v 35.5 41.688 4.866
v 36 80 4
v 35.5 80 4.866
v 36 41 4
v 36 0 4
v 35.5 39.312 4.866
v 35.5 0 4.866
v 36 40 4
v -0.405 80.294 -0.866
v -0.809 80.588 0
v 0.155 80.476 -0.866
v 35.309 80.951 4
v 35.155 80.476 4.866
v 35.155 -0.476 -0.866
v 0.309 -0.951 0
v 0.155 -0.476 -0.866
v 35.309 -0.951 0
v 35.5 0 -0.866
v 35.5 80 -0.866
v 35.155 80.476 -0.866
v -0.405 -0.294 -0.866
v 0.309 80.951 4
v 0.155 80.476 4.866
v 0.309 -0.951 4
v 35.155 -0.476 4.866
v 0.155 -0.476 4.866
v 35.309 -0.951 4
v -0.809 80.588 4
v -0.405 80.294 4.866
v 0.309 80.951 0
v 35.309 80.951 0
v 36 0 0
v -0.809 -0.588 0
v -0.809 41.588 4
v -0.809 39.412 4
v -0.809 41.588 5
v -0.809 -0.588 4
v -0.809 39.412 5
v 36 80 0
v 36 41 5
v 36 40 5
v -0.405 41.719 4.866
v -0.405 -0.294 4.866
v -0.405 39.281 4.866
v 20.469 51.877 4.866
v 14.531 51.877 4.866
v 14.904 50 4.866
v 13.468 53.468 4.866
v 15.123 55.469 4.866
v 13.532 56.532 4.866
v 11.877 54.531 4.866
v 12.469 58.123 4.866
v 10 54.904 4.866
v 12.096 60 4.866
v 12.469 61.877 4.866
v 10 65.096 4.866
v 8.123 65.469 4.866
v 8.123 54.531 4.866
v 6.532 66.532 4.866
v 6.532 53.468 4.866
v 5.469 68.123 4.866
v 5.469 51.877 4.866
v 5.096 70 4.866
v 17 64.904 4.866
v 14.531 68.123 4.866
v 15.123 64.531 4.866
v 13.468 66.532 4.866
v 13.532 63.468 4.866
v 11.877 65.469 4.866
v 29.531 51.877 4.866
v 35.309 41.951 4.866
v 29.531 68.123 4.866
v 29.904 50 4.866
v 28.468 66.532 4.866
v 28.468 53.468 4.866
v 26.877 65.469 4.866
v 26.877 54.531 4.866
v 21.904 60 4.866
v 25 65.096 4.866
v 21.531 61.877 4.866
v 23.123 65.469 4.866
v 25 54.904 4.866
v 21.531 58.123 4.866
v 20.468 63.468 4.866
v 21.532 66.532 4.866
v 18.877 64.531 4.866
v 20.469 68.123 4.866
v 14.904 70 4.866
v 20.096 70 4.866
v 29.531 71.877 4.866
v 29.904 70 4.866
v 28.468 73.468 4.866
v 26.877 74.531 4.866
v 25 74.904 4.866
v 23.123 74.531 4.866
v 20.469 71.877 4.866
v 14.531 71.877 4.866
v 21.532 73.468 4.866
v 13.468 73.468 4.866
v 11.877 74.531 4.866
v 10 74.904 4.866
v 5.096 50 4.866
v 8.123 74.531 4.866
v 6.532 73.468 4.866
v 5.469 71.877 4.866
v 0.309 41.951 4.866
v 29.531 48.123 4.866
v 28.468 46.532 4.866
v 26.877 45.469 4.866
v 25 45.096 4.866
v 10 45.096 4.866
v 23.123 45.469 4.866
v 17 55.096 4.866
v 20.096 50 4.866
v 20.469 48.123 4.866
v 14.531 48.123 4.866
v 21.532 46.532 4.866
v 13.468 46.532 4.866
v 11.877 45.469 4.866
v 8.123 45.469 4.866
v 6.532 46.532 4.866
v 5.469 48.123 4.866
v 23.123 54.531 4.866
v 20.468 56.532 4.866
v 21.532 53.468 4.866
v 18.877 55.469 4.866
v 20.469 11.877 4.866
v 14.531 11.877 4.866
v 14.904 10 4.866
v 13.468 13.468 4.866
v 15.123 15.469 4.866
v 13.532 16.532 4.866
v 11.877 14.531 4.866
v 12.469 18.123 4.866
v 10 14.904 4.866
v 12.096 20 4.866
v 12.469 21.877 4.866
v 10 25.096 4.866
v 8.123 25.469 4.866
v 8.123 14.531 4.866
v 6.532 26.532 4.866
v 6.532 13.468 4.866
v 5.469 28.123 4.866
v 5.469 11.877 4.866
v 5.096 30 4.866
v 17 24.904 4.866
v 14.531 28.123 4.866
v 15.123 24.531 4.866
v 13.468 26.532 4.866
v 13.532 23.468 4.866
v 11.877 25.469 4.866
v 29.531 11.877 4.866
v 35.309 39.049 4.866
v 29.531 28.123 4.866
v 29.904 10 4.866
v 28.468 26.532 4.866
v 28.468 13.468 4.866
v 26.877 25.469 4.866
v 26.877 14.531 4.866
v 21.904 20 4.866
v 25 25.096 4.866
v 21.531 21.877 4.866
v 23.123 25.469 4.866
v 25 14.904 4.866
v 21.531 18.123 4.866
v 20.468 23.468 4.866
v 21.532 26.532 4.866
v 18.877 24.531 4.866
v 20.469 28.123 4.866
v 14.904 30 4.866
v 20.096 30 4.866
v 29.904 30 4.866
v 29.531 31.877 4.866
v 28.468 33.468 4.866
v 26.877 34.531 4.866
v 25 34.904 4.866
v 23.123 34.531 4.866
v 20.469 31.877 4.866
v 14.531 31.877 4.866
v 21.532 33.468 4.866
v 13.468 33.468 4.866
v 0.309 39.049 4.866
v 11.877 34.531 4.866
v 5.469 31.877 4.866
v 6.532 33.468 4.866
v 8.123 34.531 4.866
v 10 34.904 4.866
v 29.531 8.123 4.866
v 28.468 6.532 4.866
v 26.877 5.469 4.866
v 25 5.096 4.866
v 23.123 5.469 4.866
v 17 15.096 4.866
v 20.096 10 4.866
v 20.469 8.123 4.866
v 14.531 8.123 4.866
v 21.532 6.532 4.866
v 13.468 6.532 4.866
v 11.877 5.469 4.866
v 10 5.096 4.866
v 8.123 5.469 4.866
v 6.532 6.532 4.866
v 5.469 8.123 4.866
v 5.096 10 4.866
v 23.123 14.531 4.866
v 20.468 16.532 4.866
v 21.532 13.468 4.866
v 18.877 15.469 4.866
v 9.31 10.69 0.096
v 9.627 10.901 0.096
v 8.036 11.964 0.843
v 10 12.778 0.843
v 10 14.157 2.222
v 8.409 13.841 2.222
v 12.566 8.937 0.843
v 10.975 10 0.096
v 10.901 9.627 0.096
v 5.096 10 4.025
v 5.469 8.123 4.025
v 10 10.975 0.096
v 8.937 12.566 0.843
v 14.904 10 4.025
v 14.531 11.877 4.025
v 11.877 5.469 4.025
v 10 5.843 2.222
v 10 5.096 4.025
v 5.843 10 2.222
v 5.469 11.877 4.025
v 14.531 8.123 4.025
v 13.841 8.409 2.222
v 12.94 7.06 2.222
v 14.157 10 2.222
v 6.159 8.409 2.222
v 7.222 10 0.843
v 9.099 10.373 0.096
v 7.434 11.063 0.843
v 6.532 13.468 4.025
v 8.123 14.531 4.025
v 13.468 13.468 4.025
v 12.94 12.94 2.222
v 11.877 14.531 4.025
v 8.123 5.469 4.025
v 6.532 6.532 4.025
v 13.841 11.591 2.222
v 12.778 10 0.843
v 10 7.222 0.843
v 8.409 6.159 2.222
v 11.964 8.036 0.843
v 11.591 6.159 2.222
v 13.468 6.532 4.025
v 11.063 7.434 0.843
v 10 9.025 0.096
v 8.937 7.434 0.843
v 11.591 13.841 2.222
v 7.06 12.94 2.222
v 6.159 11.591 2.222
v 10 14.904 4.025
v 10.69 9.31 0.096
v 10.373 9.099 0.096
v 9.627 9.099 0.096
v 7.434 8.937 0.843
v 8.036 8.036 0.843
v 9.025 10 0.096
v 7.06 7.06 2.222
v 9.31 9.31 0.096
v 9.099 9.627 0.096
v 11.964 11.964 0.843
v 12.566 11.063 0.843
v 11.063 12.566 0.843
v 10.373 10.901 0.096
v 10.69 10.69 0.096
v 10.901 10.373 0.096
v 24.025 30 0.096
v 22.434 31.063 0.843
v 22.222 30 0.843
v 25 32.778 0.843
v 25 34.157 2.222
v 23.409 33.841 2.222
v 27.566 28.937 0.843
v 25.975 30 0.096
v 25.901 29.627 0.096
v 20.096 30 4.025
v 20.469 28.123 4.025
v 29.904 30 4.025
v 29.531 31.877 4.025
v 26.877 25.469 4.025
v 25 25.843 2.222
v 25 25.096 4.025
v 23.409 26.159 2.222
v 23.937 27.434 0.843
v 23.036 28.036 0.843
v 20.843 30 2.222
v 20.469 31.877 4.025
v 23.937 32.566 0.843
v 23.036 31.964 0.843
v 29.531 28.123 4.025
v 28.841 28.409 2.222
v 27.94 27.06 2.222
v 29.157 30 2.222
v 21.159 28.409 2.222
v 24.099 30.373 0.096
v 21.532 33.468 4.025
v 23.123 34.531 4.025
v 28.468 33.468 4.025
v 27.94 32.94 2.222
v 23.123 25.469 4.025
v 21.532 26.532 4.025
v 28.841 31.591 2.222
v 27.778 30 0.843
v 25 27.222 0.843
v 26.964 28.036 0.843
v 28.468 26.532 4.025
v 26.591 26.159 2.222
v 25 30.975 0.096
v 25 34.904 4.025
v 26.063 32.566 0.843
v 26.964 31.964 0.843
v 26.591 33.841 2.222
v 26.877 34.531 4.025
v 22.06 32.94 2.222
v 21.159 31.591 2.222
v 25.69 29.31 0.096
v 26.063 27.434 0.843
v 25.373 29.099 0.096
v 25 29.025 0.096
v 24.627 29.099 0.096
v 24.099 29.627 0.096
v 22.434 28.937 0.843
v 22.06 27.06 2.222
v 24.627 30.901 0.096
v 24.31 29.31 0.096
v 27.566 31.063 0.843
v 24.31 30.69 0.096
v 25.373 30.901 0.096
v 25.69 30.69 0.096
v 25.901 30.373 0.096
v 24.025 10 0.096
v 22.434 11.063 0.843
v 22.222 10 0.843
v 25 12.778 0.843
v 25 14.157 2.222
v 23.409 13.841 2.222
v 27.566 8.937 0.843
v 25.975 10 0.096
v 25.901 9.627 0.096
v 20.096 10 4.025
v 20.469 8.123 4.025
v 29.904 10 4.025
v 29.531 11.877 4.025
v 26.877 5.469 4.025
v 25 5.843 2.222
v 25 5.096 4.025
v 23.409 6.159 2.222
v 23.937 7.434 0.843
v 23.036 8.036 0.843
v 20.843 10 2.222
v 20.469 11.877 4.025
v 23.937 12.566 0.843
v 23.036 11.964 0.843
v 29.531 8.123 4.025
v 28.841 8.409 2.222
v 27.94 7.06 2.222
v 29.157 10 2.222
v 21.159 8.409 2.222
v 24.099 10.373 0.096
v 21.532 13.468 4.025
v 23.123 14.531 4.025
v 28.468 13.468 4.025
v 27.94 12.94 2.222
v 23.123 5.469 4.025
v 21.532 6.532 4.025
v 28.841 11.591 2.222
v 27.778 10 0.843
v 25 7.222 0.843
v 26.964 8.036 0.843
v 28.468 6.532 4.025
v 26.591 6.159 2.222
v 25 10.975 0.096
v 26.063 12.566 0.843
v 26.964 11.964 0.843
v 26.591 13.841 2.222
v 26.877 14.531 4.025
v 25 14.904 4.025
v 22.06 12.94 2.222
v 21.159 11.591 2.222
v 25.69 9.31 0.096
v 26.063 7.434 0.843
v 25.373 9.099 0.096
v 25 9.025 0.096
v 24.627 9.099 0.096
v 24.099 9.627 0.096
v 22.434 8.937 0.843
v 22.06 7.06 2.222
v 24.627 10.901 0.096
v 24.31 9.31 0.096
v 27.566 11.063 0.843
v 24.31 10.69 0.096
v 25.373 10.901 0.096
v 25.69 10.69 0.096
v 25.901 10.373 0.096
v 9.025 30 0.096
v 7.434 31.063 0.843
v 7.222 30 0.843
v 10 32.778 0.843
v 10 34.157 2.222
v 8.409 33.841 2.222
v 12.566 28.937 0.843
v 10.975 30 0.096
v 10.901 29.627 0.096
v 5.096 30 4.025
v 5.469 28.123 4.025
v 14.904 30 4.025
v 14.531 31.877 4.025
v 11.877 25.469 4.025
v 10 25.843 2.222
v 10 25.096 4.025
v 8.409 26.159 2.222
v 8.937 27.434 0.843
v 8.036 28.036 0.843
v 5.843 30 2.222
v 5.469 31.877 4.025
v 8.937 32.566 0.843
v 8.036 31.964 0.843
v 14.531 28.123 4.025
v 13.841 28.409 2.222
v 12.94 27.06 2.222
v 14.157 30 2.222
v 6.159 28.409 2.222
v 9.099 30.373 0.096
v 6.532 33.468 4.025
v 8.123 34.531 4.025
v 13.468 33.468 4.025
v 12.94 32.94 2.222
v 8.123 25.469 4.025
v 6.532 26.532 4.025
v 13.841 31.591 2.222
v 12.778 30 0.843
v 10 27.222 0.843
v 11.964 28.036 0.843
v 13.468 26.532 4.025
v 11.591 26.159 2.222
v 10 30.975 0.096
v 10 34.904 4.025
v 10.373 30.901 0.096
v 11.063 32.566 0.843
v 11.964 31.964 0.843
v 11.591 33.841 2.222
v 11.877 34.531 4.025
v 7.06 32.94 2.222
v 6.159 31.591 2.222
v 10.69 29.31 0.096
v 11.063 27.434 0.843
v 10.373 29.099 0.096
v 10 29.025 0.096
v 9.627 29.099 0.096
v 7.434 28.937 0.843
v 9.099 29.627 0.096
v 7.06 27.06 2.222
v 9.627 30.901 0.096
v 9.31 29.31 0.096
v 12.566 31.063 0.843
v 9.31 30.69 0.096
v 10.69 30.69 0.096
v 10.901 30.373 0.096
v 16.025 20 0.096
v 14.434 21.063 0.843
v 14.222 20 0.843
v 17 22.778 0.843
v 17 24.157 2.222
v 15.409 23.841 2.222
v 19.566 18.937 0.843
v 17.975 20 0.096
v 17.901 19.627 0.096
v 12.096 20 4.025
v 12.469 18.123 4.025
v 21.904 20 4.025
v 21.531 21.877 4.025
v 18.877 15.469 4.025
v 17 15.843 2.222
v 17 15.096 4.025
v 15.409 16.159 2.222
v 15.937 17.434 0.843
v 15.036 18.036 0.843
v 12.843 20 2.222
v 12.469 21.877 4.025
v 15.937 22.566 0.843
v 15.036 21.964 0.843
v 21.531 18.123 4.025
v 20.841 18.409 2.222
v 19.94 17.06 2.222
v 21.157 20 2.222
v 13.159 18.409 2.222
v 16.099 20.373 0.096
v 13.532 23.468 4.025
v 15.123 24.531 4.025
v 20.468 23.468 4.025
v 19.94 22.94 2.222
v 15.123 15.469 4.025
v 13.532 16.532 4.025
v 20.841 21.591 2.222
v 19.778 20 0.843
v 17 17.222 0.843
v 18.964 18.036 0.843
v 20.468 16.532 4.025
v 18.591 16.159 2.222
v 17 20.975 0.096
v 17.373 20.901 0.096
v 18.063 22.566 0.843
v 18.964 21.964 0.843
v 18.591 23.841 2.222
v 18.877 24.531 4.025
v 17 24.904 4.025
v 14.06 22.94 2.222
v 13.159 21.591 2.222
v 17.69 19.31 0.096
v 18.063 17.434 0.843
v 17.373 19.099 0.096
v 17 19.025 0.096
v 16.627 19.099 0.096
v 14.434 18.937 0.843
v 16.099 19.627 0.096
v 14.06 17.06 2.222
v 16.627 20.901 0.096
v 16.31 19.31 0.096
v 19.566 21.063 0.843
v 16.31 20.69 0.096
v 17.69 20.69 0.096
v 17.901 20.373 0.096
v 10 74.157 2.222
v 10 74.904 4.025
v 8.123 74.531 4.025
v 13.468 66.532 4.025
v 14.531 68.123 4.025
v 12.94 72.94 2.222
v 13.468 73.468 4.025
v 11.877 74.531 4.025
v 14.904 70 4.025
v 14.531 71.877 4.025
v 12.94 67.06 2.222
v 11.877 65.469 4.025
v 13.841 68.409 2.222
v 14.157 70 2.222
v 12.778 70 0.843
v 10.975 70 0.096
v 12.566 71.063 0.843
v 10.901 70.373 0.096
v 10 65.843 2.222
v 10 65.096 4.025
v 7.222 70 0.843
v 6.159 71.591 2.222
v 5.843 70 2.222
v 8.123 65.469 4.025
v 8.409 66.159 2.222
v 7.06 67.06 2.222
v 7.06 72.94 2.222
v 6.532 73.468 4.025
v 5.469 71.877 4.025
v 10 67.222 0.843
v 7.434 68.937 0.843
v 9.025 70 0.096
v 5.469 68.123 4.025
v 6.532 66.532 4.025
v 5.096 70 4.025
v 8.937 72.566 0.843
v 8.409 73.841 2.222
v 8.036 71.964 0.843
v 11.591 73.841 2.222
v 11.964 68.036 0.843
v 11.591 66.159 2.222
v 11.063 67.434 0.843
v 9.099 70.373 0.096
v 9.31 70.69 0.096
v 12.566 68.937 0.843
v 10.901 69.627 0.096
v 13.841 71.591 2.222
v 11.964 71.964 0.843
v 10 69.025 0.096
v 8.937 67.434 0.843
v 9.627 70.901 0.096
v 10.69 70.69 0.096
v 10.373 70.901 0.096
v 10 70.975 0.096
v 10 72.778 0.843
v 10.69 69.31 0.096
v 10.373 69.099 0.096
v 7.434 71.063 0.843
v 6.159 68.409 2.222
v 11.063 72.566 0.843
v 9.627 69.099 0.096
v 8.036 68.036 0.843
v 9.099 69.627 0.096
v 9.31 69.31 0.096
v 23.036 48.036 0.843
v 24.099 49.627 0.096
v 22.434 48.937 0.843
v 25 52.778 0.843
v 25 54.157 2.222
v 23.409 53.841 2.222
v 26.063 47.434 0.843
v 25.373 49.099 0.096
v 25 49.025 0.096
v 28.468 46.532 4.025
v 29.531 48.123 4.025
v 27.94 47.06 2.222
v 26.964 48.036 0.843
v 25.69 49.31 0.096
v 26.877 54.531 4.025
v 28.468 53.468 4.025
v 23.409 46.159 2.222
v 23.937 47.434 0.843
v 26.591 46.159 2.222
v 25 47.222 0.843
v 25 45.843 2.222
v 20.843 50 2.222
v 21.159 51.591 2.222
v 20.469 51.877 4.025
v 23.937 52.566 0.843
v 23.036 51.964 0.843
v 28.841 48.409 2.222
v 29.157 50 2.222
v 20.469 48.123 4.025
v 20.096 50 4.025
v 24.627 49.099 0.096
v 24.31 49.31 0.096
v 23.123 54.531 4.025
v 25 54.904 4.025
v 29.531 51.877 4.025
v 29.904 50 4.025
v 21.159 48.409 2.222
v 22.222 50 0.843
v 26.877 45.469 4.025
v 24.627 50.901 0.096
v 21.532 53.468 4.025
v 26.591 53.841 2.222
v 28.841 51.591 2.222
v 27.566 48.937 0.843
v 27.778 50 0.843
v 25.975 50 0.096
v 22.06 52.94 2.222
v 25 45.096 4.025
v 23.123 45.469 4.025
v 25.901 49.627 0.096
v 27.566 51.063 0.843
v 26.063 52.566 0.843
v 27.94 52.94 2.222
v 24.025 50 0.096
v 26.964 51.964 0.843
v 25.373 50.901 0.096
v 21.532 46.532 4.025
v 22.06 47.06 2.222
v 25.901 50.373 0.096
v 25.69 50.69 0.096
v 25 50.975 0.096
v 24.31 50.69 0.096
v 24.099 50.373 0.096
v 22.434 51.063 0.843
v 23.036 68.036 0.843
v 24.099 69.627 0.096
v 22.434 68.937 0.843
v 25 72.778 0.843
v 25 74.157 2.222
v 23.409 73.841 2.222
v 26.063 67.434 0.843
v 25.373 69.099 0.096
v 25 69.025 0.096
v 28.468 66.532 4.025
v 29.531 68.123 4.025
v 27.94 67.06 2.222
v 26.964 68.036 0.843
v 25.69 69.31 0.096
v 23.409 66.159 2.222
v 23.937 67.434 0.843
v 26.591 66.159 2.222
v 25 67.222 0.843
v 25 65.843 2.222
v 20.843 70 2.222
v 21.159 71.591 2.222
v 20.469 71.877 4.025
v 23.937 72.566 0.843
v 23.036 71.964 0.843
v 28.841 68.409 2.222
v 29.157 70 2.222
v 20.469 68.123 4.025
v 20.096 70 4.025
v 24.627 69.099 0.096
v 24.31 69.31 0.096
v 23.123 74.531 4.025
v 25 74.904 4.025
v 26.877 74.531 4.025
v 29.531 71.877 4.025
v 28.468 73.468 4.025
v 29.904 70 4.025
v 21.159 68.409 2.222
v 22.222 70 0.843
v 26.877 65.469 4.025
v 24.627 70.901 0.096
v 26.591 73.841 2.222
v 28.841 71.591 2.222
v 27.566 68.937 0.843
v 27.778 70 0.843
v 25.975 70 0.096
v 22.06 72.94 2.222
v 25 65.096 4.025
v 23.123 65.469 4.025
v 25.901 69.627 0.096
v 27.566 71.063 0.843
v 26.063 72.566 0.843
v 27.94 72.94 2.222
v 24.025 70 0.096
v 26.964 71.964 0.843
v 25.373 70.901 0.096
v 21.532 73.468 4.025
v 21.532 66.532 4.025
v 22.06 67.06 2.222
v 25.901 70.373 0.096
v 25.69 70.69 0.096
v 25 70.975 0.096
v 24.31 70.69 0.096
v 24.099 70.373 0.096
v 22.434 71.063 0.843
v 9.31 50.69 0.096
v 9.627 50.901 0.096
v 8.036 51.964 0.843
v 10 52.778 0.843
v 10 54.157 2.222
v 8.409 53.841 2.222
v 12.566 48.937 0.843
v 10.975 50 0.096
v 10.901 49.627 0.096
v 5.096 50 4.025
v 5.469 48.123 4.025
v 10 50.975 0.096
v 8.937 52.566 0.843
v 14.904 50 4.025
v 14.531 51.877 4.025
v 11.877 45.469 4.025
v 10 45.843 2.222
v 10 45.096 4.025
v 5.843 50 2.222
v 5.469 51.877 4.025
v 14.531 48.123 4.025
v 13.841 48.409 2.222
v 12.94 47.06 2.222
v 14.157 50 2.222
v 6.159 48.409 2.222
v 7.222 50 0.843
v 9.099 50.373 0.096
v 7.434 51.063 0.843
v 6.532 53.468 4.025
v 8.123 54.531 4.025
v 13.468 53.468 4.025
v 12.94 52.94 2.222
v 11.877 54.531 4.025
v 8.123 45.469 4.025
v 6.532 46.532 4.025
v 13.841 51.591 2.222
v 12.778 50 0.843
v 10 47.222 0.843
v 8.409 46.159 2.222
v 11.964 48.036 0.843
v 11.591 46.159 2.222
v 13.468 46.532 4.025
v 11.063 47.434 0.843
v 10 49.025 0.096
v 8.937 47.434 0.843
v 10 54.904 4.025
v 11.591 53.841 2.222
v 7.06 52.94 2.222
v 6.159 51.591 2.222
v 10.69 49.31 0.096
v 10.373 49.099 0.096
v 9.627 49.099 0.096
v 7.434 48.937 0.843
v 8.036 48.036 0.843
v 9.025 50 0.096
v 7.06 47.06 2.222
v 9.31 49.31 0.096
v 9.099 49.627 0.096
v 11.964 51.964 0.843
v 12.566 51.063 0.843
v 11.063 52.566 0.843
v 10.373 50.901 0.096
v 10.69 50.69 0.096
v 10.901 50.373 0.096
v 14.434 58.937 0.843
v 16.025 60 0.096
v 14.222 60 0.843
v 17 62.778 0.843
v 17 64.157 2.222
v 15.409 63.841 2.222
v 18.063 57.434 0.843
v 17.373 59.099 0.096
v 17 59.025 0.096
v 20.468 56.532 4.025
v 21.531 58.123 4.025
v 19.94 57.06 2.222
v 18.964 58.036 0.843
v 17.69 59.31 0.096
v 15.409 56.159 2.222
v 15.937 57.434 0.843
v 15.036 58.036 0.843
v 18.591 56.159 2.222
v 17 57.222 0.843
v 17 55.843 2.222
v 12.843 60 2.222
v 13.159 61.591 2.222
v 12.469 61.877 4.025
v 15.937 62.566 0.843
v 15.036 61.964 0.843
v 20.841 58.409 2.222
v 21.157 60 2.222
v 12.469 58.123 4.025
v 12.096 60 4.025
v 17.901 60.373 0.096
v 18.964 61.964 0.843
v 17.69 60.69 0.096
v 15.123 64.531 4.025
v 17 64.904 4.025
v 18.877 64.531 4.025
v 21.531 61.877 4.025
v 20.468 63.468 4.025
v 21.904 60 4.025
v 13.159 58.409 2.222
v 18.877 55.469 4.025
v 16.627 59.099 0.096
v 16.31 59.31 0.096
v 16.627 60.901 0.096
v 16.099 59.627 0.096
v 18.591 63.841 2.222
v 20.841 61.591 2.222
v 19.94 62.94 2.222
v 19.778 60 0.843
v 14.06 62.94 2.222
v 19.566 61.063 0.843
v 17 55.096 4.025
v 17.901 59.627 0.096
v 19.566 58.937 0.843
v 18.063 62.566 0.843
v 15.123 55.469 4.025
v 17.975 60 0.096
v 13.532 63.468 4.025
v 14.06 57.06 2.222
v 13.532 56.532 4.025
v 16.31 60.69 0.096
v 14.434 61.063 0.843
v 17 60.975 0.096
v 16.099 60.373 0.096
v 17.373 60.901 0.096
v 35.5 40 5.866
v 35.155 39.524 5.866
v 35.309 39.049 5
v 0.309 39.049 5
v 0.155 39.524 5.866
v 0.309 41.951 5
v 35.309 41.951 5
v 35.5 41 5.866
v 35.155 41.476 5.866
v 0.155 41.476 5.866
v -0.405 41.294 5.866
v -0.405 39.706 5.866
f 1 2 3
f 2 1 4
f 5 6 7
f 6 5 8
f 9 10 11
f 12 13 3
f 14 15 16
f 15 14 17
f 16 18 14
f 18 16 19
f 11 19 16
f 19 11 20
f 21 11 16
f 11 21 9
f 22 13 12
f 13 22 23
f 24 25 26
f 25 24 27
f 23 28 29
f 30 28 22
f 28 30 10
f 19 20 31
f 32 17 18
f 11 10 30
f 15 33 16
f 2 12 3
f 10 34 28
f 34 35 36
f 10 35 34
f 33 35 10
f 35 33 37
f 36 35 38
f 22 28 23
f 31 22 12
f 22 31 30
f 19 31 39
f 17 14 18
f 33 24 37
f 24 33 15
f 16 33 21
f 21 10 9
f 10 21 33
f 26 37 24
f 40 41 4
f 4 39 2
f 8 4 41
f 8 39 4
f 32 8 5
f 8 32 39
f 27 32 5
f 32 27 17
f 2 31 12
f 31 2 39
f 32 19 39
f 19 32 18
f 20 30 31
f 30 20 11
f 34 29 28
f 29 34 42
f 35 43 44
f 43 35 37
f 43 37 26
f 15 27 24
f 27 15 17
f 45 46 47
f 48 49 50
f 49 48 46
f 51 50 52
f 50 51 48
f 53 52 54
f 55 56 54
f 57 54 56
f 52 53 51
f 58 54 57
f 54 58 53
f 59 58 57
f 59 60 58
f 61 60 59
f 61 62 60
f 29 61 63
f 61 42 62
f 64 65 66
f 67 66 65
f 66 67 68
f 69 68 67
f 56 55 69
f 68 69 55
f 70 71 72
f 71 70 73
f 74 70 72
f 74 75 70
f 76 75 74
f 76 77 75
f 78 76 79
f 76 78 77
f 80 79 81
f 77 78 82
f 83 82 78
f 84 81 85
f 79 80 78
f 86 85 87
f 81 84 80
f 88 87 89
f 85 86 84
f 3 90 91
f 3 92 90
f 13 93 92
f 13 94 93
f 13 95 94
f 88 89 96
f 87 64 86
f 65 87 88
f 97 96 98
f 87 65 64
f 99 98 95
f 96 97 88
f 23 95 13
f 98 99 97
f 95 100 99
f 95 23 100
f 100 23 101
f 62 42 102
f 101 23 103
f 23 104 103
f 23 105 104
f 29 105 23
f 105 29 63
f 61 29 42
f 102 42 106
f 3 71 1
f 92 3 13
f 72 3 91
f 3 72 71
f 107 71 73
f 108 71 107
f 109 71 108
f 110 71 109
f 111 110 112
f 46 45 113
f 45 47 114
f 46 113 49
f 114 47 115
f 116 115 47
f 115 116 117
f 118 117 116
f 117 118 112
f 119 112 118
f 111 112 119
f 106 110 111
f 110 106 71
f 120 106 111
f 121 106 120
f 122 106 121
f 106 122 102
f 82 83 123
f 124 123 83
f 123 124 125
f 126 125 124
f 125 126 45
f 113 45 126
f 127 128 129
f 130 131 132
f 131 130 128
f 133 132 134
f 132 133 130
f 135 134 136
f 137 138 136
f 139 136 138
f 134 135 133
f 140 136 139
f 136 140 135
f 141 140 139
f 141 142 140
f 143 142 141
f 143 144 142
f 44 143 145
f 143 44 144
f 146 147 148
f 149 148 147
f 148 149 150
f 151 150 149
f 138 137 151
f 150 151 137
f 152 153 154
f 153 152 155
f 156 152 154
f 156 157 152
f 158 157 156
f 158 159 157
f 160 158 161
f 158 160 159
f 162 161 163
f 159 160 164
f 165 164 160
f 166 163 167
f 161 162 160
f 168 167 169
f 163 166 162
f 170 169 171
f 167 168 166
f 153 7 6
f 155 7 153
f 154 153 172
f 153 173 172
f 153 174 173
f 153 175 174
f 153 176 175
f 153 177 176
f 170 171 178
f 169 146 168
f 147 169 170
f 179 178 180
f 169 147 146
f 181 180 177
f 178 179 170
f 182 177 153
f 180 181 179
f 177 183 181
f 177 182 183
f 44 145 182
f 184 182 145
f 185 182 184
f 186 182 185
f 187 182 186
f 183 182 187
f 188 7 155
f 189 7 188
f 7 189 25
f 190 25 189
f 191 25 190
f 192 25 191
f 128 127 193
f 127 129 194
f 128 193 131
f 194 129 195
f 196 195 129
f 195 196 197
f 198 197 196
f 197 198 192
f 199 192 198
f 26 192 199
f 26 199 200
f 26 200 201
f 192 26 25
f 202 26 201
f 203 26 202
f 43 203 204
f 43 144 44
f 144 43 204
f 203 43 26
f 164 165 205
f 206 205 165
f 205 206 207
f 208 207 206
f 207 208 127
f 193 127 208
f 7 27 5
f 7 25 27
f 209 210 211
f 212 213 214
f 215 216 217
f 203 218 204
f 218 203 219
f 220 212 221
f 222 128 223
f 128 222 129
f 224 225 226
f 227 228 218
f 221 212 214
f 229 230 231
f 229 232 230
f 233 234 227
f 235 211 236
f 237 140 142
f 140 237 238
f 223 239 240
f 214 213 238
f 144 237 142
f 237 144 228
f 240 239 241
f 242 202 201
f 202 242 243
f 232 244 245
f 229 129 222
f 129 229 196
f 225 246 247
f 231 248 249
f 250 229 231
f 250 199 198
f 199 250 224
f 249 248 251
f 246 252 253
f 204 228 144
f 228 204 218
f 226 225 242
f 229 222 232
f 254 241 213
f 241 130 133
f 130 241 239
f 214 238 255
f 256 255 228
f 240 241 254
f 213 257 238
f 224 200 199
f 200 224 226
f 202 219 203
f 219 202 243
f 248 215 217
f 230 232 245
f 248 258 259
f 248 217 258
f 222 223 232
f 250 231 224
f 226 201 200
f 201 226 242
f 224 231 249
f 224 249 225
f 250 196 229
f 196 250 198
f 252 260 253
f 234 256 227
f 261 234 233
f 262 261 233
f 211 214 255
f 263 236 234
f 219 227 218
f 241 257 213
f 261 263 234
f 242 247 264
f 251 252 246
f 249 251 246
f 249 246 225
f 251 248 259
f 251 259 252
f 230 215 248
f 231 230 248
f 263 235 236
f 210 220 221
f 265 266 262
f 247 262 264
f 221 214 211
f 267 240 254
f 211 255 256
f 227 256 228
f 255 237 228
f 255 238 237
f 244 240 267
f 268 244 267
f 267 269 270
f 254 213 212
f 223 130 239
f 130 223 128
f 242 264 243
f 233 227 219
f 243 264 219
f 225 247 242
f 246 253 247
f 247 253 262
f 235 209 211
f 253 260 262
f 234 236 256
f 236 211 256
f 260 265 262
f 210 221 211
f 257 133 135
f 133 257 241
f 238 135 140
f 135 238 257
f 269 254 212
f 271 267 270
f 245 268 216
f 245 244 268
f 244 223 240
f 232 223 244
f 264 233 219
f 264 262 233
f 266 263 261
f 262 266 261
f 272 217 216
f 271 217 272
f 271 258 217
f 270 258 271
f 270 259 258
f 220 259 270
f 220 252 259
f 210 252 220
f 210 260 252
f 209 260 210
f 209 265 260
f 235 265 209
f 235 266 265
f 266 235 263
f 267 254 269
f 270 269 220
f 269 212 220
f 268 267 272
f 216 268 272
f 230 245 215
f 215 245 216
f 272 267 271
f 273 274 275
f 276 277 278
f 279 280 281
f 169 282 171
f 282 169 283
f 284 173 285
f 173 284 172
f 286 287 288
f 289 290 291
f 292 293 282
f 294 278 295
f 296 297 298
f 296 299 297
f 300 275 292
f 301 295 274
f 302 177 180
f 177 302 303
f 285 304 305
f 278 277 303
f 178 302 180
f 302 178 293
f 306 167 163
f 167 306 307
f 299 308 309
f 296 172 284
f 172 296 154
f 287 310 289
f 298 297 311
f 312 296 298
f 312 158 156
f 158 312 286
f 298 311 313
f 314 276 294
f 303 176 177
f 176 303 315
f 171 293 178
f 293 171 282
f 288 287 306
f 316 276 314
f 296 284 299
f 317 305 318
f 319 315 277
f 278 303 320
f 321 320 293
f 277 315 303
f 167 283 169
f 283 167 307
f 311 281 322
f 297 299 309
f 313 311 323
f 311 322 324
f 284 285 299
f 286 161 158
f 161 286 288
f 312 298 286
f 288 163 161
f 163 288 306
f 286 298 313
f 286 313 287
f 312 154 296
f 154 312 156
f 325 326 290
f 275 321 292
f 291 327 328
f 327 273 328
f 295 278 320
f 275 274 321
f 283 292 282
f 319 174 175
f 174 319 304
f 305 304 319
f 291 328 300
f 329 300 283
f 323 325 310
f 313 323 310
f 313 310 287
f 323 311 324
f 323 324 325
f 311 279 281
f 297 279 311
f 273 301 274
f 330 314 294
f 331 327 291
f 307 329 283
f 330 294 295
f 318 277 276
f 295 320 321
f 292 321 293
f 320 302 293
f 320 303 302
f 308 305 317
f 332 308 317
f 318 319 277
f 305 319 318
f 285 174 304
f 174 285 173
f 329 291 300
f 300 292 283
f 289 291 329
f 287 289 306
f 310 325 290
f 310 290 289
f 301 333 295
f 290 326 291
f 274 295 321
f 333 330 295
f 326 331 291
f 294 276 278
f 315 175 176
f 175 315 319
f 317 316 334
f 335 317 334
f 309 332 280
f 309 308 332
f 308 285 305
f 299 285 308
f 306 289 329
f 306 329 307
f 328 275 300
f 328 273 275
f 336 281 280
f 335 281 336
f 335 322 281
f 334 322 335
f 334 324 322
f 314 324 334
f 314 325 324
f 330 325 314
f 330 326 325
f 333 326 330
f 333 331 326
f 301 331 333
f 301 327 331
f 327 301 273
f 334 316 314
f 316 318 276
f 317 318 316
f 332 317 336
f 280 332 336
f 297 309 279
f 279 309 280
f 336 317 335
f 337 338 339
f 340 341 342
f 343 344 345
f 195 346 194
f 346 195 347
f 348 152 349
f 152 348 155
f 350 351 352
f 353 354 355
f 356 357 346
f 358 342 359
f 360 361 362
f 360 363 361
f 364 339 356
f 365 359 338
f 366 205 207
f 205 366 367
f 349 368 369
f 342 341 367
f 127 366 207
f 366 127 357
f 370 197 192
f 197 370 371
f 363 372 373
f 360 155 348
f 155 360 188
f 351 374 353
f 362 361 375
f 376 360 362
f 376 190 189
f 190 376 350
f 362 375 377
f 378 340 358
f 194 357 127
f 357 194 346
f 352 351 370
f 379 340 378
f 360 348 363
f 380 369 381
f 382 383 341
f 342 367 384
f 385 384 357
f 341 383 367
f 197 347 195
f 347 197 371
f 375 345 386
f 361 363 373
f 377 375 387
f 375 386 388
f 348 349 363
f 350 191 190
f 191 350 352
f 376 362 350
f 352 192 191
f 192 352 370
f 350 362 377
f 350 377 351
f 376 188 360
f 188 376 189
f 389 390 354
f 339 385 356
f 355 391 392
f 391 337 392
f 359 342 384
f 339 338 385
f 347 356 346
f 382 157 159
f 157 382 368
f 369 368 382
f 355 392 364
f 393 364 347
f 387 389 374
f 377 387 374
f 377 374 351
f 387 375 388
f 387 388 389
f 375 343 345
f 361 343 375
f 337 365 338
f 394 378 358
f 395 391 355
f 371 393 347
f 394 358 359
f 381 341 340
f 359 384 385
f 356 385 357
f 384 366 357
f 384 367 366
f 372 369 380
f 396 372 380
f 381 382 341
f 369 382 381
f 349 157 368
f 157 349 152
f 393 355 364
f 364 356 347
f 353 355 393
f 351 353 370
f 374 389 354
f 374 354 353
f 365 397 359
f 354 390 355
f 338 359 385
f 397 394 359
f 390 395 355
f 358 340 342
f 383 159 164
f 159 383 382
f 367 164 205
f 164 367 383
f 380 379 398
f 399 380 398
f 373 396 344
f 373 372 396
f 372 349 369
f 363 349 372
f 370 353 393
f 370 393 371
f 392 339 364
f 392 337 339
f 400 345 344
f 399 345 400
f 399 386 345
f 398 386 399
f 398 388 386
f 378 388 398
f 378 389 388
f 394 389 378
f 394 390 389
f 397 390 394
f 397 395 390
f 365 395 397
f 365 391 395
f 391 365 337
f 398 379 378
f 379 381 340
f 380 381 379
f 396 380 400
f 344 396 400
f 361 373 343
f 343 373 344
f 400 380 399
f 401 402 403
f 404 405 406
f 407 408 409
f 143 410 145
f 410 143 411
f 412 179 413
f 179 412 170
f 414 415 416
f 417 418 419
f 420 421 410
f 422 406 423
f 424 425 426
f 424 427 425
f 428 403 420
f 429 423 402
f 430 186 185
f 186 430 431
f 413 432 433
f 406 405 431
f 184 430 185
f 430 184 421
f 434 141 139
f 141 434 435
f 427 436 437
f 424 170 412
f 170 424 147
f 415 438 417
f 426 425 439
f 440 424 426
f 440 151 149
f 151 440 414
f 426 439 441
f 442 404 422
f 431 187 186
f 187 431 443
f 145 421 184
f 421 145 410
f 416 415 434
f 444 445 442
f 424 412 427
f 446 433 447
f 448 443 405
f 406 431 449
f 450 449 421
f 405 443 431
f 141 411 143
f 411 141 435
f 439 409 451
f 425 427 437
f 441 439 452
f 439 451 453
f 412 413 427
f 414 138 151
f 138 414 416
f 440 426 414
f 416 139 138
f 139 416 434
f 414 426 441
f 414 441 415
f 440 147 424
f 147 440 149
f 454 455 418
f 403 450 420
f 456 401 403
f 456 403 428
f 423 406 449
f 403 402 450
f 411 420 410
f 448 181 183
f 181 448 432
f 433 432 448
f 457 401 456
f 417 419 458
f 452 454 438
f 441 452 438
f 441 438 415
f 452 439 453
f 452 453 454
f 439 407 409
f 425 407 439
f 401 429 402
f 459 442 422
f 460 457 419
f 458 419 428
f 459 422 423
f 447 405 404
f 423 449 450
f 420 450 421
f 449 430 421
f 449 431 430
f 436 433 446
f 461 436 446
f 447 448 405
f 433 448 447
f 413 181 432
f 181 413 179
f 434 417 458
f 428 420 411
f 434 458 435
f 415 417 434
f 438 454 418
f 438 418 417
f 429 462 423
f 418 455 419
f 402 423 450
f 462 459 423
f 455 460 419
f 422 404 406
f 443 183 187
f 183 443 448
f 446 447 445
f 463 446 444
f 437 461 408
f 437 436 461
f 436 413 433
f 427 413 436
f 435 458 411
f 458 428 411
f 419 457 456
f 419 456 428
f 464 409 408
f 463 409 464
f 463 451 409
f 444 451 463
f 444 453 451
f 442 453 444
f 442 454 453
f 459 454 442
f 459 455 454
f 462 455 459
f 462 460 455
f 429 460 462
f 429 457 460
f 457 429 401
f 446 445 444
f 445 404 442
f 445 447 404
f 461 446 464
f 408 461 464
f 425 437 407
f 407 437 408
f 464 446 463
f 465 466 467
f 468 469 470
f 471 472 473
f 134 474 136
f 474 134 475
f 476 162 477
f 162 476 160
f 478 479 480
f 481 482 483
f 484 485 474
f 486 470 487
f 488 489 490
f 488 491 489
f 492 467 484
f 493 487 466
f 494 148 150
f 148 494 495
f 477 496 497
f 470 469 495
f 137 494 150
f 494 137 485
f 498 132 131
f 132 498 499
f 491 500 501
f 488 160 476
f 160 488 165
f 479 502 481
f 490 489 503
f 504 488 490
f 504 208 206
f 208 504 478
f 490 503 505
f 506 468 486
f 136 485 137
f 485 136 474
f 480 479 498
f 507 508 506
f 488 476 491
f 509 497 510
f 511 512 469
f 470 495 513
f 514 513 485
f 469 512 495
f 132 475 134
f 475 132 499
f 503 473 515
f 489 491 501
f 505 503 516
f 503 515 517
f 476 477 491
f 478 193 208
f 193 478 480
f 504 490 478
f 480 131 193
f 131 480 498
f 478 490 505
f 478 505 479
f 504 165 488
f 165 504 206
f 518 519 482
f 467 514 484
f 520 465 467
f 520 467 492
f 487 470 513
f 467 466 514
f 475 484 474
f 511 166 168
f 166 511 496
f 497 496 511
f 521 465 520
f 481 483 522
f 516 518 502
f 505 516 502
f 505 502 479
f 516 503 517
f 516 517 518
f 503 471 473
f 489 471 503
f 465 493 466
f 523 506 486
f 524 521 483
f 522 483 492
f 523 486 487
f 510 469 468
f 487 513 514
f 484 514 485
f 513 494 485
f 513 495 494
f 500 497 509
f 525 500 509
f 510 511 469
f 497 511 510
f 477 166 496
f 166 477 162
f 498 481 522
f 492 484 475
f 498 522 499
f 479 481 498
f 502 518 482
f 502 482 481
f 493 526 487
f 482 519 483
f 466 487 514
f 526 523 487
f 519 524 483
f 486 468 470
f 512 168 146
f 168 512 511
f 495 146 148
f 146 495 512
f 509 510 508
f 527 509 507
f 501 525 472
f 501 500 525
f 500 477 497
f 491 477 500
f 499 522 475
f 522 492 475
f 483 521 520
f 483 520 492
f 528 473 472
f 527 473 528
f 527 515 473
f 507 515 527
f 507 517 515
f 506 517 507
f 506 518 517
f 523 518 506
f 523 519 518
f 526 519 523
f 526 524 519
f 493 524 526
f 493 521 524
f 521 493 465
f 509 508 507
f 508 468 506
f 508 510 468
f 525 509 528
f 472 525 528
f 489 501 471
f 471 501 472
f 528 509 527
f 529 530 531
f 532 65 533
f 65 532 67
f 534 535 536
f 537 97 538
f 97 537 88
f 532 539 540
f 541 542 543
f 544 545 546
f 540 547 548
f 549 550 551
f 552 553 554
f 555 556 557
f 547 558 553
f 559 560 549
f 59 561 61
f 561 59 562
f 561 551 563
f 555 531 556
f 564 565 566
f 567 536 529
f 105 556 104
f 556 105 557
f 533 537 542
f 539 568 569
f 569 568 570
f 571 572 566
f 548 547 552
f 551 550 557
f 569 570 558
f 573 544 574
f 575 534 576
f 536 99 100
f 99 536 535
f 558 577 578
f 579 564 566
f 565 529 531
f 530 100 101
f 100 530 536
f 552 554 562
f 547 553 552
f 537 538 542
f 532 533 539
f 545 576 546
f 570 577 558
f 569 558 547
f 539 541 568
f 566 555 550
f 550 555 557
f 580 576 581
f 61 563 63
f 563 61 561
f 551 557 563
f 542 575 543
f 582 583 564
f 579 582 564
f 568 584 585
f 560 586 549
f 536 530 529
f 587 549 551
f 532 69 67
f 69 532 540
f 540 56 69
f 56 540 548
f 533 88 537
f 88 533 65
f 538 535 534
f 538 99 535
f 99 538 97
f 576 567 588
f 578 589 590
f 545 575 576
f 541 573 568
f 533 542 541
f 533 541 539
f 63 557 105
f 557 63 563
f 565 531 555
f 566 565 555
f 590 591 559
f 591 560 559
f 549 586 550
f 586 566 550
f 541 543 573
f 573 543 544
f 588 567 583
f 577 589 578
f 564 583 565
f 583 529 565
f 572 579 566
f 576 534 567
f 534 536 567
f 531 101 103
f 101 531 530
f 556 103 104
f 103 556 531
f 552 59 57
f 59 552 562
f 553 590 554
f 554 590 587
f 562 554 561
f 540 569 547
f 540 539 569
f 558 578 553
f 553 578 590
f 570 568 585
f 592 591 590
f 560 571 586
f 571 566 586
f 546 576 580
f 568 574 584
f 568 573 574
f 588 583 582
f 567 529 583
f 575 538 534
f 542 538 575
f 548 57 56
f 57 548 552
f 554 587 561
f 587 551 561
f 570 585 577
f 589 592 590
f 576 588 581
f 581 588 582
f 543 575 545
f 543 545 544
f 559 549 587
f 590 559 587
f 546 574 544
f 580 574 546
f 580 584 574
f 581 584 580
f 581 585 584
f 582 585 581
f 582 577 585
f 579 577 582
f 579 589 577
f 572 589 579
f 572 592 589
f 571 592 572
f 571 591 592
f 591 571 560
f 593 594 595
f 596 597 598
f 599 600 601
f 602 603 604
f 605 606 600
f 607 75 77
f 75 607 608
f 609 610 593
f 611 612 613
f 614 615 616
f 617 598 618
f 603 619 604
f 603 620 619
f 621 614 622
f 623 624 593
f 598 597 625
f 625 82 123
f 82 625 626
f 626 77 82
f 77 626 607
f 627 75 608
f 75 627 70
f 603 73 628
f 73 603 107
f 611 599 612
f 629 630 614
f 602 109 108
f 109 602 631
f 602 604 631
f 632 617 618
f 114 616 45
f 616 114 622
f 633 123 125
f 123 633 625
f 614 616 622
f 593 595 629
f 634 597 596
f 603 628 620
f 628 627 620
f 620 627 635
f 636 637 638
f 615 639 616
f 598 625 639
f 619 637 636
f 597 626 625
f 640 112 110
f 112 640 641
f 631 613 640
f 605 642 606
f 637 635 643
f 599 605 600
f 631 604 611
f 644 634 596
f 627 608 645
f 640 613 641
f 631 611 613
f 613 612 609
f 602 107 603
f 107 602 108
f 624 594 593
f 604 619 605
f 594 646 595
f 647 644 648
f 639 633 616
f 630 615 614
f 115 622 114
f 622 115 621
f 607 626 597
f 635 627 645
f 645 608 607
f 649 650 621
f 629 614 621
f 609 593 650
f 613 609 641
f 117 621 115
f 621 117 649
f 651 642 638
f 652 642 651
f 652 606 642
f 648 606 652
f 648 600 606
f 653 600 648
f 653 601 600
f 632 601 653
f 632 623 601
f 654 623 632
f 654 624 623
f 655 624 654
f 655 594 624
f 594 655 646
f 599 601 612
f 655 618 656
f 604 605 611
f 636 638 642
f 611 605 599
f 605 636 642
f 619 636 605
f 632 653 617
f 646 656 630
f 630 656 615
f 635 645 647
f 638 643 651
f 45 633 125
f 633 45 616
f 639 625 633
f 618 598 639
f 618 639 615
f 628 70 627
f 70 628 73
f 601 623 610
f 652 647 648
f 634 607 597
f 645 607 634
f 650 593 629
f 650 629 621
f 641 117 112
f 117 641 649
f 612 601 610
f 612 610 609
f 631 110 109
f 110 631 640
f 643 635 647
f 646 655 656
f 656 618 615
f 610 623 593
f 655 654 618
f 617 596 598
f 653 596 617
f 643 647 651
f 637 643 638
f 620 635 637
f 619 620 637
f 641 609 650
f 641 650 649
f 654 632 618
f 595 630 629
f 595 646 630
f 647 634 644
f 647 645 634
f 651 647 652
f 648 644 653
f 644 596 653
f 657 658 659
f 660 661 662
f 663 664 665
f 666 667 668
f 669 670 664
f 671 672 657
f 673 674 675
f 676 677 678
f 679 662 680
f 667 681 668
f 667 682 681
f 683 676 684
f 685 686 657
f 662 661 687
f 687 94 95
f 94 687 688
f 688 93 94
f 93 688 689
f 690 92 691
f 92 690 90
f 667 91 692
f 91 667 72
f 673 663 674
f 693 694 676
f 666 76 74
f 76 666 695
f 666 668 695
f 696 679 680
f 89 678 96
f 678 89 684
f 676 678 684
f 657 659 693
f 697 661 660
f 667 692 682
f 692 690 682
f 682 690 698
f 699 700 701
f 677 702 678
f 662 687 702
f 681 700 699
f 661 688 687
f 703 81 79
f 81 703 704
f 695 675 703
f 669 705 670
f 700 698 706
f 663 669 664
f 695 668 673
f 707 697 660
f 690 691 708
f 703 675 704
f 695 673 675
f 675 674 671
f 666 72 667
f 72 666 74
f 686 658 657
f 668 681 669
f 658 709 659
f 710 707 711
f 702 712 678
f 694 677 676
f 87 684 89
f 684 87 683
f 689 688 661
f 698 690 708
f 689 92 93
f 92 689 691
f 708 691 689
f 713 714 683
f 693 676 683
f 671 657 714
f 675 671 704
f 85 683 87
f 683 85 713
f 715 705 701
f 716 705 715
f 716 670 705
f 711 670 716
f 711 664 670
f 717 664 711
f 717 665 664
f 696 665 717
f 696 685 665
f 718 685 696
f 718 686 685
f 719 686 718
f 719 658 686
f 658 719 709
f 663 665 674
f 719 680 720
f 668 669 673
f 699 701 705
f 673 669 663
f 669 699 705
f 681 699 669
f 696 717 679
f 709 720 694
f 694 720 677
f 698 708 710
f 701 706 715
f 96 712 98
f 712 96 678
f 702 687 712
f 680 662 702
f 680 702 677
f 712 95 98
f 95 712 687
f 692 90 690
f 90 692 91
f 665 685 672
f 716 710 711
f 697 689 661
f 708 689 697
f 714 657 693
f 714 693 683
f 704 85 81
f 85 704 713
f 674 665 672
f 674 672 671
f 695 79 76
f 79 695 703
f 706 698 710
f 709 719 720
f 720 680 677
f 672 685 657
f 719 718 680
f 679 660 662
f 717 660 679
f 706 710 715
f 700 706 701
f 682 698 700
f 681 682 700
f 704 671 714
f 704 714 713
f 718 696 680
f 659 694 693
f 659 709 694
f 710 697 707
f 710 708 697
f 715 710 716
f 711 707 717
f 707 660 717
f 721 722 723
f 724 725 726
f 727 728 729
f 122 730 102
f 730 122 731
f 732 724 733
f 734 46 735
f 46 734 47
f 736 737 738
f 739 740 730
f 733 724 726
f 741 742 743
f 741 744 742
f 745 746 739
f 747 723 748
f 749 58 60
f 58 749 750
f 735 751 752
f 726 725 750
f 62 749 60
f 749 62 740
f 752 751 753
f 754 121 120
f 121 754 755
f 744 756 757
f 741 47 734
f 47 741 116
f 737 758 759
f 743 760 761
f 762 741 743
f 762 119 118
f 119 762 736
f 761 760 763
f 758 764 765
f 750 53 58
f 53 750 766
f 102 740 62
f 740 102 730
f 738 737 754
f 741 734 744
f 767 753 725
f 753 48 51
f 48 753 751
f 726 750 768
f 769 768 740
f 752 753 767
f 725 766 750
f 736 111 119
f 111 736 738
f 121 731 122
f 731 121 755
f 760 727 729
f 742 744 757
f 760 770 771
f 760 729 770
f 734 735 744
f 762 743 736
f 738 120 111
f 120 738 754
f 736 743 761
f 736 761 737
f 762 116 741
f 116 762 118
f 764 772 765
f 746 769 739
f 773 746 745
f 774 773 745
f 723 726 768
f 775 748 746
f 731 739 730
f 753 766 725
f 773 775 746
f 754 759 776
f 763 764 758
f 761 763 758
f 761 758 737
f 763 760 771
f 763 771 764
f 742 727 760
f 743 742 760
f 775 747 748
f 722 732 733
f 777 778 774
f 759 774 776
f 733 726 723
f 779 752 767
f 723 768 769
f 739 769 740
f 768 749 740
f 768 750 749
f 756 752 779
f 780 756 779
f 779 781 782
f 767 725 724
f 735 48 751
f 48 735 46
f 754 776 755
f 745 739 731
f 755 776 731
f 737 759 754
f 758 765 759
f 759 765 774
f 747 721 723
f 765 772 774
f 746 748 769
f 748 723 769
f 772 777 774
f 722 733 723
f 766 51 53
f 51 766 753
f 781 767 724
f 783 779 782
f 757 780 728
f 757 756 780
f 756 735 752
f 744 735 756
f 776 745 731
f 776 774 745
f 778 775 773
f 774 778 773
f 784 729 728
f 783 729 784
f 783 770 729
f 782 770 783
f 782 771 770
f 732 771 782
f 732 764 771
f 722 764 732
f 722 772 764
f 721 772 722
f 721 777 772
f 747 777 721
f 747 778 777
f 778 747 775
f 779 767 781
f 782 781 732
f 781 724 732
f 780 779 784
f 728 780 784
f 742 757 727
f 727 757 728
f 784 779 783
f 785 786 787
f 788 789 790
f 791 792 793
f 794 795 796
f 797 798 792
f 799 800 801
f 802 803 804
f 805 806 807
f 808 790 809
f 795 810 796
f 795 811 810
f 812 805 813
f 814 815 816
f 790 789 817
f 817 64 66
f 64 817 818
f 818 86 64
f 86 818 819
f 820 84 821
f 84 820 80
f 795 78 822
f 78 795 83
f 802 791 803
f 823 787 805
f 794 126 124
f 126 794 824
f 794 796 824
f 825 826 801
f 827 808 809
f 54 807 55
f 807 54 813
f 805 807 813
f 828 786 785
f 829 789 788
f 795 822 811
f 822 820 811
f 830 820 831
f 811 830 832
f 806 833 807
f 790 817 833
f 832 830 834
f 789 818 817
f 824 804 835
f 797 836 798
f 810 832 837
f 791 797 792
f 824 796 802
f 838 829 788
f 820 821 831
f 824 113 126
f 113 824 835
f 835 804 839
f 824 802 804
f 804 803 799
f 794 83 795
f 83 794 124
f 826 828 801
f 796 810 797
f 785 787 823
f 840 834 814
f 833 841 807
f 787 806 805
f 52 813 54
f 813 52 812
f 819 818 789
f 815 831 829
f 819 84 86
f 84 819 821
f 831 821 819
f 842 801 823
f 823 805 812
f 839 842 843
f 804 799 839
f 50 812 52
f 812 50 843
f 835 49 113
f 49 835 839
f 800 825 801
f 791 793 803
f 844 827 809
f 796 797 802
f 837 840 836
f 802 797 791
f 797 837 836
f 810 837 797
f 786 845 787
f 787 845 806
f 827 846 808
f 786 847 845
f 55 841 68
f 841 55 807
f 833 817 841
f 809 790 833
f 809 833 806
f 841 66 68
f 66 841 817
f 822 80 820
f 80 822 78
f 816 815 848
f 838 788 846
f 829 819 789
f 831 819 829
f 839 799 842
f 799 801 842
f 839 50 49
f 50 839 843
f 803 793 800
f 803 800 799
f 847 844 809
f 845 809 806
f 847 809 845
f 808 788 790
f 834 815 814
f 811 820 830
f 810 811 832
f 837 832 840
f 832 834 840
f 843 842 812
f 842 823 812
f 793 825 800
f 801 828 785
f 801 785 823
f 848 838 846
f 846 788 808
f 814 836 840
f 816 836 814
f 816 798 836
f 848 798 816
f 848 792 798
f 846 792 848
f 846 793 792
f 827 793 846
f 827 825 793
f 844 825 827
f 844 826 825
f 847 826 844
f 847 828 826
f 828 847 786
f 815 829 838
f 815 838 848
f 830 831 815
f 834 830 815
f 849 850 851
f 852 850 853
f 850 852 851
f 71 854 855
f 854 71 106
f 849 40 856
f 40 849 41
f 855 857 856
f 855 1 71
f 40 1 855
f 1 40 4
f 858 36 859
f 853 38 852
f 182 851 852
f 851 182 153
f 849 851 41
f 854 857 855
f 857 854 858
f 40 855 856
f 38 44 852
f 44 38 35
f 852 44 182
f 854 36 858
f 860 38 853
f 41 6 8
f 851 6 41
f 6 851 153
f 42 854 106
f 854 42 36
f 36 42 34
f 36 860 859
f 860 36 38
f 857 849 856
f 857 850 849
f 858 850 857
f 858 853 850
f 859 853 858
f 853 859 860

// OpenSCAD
// Loguncov Maxim 13.12.13


//$fn=128;


translate([0,40,0])
minkowski()
{cube([35,1,5]);
sphere(1);
}

difference() {

//основа
minkowski()
{cube([35,80,4]);
sphere(1);
}

//отверстия
translate([10,10,5])sphere(5);
translate([25,30,5])sphere(5);
translate([25,10,5])sphere(5);
translate([10,30,5])sphere(5);
translate([17,20,5])sphere(5);


translate([10,70,5])sphere(5);
translate([25,50,5])sphere(5);
translate([25,70,5])sphere(5);
translate([10,50,5])sphere(5);
translate([17,60,5])sphere(5);
}
